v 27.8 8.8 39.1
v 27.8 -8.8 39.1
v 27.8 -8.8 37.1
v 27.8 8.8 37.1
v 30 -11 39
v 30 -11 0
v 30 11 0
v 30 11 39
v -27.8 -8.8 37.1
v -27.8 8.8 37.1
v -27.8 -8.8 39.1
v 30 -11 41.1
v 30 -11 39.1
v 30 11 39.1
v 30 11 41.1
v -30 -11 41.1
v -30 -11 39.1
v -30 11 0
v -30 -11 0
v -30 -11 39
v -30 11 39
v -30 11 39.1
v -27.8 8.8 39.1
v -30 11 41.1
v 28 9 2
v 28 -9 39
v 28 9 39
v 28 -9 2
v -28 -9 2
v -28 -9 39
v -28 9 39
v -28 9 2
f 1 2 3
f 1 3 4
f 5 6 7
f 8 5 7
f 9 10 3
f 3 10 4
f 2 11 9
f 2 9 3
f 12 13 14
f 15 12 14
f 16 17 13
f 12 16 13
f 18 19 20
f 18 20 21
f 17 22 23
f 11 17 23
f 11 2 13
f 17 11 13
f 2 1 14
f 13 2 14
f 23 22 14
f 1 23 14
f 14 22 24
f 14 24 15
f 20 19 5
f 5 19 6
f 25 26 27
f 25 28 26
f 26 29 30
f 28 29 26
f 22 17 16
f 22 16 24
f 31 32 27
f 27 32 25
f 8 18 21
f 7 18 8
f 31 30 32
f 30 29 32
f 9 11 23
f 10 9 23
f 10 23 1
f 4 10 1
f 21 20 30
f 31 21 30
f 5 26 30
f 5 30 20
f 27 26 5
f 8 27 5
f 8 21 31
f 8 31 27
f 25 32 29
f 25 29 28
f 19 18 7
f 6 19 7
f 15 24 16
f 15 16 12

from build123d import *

# Parameters (mm, degrees)
F0_W     = 60
F0_H     = 22
F1_DEPTH = 39
F2_T     = -2
F4_W     = 60
F4_H     = 22
F4_W_2   = 56
F4_H_2   = 18
F4_W_3   = 55.6
F4_H_3   = 17.6
F5_DEPTH = 2
F6_DEPTH = 2


with BuildPart() as f1:
    # F0 (on Top) → F1 (new body)
    with BuildSketch(Plane.XY):
        Rectangle(F0_W, F0_H)
    extrude(amount=F1_DEPTH)

    # F2
    f2_openings = [f1.faces().sort_by_distance(p)[0] for p in [
        (0, 0, 39),
    ]]
    offset(amount=F2_T, openings=f2_openings)


with BuildPart() as f5:
    # F4 (on offset) → F5 (new body)
    with BuildSketch(Plane.XY.offset(39.1)):
        Rectangle(F4_W, F4_H)
        Rectangle(F4_W_2, F4_H_2, mode=Mode.SUBTRACT)
        Rectangle(F4_W_2, F4_H_2)
        Rectangle(F4_W_3, F4_H_3, mode=Mode.SUBTRACT)
        Rectangle(F4_W_3, F4_H_3)
    extrude(amount=F5_DEPTH)

    # F4 (on offset) → F6 (join)
    with BuildSketch(Plane.XY.offset(39.1)):
        Rectangle(F4_W_3, F4_H_3)
    extrude(amount=-F6_DEPTH)


solid = Compound([f1.part, f5.part])
